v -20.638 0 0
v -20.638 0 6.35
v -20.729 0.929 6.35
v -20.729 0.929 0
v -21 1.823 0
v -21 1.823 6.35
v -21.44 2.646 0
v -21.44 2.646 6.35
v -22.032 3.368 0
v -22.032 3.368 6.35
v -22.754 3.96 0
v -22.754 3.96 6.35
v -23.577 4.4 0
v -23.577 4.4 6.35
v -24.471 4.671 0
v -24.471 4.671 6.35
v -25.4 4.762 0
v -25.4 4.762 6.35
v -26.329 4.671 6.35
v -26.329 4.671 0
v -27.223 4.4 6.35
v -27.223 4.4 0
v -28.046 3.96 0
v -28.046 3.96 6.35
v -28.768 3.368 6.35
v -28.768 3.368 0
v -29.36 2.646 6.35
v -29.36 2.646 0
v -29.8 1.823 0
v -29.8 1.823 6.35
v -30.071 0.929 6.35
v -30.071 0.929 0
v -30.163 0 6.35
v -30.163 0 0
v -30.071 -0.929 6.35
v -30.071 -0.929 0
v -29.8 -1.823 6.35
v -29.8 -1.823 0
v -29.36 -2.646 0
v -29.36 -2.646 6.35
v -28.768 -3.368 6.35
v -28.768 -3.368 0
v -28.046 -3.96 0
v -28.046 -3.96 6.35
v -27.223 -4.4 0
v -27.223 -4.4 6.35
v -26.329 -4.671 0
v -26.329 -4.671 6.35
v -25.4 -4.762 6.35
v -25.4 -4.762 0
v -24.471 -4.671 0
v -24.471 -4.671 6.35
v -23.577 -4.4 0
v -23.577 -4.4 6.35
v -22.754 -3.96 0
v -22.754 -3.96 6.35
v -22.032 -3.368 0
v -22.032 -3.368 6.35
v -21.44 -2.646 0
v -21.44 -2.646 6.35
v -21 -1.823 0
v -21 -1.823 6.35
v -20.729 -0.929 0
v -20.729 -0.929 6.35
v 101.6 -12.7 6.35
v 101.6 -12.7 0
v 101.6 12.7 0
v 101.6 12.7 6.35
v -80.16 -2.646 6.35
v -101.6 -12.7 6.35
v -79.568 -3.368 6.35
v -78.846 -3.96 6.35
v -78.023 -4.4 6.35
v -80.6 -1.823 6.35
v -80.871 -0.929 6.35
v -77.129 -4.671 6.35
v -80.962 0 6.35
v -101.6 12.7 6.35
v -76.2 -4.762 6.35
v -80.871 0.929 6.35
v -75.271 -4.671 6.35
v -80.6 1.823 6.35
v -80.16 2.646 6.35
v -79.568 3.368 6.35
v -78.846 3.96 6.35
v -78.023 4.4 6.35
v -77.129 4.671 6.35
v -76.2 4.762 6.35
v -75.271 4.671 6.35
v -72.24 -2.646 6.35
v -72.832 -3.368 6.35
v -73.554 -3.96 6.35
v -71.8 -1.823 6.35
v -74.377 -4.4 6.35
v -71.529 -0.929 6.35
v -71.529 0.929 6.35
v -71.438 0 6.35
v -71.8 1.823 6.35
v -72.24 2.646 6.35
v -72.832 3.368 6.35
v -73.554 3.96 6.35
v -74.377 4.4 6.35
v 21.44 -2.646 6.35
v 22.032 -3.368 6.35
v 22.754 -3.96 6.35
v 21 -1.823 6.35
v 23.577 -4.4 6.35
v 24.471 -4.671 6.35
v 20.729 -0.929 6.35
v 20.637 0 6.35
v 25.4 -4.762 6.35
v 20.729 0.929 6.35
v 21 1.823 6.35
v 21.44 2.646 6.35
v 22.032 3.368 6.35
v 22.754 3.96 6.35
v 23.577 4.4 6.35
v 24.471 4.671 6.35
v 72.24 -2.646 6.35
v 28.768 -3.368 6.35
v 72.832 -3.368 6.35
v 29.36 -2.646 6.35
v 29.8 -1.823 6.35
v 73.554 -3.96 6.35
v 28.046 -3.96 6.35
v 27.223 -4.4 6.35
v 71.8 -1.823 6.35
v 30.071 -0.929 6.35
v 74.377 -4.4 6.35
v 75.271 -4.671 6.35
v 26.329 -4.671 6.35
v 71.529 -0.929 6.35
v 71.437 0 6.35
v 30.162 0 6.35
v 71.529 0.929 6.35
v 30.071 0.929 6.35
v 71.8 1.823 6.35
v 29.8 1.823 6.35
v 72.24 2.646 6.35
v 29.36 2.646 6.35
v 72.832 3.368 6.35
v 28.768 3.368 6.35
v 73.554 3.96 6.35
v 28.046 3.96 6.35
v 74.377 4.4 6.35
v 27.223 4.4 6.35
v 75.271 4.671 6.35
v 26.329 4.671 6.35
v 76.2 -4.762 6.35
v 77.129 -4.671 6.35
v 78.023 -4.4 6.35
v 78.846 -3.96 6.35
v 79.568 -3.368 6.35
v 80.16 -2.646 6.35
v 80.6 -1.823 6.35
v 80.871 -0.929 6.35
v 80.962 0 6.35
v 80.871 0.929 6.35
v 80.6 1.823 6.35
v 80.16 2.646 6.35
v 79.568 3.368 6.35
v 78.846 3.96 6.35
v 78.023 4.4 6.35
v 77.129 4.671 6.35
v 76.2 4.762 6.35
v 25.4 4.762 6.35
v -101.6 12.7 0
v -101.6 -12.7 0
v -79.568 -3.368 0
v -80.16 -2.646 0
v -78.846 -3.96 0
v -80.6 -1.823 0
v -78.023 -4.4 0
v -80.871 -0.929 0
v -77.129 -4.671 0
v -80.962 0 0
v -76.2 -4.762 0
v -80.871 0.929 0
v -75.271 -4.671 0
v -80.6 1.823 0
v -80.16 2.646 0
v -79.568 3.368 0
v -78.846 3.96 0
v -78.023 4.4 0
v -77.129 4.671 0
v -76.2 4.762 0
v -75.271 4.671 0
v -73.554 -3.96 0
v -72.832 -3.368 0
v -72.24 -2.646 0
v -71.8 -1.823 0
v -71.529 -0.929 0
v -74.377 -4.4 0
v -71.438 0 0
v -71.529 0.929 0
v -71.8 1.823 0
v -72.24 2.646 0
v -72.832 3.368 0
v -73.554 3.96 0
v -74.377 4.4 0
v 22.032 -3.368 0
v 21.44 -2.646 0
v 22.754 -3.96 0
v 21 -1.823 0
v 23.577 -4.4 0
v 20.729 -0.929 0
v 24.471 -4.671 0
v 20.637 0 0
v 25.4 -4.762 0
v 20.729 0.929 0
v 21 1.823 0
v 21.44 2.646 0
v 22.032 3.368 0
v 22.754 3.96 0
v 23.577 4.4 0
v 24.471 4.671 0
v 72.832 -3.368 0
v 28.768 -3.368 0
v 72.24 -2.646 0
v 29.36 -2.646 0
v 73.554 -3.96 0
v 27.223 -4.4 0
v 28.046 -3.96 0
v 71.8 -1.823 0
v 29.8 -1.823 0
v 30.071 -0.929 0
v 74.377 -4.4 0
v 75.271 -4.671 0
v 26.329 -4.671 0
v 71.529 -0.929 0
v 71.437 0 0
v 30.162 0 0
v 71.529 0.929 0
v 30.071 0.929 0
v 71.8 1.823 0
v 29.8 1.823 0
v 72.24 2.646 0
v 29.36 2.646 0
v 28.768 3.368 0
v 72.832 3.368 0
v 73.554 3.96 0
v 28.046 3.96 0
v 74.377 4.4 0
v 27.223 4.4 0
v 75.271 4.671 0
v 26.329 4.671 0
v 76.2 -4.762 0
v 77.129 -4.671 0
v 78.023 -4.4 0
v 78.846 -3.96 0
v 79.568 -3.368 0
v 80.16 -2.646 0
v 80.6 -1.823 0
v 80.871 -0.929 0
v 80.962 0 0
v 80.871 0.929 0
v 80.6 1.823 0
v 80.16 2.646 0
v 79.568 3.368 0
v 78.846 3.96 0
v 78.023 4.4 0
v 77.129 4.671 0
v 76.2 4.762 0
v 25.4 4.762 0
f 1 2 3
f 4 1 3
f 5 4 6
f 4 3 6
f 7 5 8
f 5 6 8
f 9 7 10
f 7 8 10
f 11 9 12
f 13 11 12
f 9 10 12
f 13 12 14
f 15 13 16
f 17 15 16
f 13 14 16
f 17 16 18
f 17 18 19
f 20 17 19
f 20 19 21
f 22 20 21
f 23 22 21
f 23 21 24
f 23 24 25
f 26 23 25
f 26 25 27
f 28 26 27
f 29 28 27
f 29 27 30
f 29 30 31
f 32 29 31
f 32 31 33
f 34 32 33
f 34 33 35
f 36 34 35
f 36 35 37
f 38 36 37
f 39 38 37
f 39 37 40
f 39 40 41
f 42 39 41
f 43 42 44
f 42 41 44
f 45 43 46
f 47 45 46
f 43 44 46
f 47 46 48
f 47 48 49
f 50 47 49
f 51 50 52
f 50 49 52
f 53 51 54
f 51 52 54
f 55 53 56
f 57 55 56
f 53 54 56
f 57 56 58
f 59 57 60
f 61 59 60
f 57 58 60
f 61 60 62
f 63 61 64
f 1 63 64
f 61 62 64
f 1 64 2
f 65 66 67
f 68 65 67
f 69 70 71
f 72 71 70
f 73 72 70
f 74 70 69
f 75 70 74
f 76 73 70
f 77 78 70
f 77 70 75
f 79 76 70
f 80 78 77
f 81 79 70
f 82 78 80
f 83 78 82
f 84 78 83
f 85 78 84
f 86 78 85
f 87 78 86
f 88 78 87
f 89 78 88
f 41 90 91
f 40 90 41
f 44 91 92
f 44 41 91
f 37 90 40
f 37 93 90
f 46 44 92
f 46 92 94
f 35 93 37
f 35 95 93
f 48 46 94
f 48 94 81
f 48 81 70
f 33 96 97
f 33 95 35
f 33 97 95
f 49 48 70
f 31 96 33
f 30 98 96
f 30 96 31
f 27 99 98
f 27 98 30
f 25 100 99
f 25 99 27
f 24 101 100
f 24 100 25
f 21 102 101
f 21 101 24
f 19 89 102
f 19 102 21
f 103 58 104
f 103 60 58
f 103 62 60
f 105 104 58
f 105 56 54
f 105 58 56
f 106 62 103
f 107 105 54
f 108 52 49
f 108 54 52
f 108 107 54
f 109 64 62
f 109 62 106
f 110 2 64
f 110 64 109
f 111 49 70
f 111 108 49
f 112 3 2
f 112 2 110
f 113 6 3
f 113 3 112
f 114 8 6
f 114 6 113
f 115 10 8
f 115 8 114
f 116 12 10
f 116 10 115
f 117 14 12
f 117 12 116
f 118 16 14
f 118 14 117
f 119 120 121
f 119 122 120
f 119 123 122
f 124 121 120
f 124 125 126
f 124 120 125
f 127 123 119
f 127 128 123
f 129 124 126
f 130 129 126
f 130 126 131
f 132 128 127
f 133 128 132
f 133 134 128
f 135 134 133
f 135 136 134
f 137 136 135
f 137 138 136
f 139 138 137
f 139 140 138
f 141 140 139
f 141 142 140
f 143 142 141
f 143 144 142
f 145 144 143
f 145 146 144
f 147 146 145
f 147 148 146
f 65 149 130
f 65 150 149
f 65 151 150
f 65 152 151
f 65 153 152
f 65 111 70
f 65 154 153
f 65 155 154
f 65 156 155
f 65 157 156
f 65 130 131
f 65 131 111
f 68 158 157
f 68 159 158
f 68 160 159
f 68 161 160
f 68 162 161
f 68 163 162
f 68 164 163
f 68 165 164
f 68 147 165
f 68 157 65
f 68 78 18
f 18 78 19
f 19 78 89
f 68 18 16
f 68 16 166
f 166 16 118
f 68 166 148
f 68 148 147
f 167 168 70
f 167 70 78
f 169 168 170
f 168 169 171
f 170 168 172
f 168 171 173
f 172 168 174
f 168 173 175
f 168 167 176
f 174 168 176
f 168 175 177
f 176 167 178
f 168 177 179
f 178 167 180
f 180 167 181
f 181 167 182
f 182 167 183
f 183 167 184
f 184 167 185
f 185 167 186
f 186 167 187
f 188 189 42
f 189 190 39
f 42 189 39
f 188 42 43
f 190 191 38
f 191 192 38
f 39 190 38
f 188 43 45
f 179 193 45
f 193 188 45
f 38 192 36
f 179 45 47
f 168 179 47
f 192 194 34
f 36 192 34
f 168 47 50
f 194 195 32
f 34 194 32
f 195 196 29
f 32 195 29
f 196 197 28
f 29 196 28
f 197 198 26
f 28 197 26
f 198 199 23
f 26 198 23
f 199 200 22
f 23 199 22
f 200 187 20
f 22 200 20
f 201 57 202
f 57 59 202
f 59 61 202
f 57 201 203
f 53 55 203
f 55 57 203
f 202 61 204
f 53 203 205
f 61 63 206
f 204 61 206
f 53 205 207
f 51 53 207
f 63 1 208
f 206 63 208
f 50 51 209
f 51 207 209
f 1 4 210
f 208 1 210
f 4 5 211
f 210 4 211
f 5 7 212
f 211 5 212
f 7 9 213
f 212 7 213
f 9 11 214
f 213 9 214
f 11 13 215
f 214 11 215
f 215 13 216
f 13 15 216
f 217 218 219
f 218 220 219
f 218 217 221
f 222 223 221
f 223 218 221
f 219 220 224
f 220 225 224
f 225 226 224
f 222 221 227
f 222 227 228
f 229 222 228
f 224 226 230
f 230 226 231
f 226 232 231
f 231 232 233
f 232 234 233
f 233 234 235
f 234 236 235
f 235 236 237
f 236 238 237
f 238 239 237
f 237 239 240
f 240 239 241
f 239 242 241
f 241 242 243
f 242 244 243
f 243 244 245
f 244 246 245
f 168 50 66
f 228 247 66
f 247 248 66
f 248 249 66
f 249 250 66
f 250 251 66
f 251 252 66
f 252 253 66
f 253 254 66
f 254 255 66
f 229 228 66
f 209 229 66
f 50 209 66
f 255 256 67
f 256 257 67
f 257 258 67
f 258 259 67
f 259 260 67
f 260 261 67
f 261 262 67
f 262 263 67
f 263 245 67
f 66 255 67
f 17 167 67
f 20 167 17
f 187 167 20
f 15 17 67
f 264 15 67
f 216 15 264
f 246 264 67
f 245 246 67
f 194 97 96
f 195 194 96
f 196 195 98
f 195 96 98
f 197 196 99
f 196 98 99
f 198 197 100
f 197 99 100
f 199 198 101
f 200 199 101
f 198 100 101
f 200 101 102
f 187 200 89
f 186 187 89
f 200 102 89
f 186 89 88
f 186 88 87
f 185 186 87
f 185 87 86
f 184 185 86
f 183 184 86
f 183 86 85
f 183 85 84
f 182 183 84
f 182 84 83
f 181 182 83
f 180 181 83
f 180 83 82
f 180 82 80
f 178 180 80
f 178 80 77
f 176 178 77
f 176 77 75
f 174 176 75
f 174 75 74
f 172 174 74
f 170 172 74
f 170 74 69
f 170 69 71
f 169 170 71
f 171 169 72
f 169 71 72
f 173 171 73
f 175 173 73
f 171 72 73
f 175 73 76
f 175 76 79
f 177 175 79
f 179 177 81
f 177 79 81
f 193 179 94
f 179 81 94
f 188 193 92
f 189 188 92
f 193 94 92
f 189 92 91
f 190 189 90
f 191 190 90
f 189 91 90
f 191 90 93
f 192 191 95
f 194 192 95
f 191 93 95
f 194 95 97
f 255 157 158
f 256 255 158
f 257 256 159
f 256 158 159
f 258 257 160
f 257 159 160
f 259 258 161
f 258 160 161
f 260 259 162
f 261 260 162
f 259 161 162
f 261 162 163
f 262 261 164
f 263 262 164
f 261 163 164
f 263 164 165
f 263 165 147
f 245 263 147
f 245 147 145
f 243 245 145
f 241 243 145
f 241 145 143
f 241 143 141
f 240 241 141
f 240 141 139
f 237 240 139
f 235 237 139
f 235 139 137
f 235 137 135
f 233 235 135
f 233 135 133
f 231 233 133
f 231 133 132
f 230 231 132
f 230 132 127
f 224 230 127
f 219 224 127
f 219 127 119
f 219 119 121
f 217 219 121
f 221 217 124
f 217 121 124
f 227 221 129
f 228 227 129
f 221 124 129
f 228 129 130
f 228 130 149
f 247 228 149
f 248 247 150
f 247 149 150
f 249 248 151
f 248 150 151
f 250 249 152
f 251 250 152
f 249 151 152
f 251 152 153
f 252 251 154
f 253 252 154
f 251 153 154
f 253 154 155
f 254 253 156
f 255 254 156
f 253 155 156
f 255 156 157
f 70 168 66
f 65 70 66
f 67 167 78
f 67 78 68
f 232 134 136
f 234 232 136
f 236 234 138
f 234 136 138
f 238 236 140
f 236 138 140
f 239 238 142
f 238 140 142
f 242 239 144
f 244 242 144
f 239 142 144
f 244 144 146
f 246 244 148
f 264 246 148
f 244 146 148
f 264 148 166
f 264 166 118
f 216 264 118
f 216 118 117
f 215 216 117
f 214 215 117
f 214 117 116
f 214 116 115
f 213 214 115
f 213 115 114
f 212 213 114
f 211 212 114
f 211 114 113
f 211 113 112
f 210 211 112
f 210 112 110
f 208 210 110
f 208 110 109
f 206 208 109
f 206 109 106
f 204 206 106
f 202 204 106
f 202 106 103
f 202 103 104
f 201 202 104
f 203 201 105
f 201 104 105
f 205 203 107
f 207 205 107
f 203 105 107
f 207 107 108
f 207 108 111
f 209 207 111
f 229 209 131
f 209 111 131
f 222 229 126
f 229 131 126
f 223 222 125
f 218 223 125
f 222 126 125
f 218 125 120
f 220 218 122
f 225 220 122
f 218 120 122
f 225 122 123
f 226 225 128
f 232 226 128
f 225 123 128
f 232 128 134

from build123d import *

# Parameters (mm, degrees)
SKETCH1_W           = 203.2
SKETCH1_H           = 25.4
BOSS_EXTRUDE1_DEPTH = 6.35
SKETCH2_R           = 4.7625
CUT_EXTRUDE1_DEPTH  = 7.35
LPATTERN1_COUNT     = 4
LPATTERN1_PITCH     = 50.8


with BuildPart() as part:
    # Sketch1 → Boss-Extrude1 (new body)
    with BuildSketch(Plane.XY):
        Rectangle(SKETCH1_W, SKETCH1_H)
    extrude(amount=BOSS_EXTRUDE1_DEPTH)

    # Sketch2 → Cut-Extrude1 (cut, through all)
    with BuildSketch(Plane.XY.offset(6.35)):
        with Locations((-76.2, 0)):
            Circle(SKETCH2_R)
    cut_extrude1 = extrude(amount=-CUT_EXTRUDE1_DEPTH, mode=Mode.SUBTRACT)

    # LPattern1: Cut-Extrude1 ×4
    with Locations(*[(i * LPATTERN1_PITCH, 0, 0) for i in range(1, LPATTERN1_COUNT)]):
        add(cut_extrude1, mode=Mode.SUBTRACT)


solid = part.part
